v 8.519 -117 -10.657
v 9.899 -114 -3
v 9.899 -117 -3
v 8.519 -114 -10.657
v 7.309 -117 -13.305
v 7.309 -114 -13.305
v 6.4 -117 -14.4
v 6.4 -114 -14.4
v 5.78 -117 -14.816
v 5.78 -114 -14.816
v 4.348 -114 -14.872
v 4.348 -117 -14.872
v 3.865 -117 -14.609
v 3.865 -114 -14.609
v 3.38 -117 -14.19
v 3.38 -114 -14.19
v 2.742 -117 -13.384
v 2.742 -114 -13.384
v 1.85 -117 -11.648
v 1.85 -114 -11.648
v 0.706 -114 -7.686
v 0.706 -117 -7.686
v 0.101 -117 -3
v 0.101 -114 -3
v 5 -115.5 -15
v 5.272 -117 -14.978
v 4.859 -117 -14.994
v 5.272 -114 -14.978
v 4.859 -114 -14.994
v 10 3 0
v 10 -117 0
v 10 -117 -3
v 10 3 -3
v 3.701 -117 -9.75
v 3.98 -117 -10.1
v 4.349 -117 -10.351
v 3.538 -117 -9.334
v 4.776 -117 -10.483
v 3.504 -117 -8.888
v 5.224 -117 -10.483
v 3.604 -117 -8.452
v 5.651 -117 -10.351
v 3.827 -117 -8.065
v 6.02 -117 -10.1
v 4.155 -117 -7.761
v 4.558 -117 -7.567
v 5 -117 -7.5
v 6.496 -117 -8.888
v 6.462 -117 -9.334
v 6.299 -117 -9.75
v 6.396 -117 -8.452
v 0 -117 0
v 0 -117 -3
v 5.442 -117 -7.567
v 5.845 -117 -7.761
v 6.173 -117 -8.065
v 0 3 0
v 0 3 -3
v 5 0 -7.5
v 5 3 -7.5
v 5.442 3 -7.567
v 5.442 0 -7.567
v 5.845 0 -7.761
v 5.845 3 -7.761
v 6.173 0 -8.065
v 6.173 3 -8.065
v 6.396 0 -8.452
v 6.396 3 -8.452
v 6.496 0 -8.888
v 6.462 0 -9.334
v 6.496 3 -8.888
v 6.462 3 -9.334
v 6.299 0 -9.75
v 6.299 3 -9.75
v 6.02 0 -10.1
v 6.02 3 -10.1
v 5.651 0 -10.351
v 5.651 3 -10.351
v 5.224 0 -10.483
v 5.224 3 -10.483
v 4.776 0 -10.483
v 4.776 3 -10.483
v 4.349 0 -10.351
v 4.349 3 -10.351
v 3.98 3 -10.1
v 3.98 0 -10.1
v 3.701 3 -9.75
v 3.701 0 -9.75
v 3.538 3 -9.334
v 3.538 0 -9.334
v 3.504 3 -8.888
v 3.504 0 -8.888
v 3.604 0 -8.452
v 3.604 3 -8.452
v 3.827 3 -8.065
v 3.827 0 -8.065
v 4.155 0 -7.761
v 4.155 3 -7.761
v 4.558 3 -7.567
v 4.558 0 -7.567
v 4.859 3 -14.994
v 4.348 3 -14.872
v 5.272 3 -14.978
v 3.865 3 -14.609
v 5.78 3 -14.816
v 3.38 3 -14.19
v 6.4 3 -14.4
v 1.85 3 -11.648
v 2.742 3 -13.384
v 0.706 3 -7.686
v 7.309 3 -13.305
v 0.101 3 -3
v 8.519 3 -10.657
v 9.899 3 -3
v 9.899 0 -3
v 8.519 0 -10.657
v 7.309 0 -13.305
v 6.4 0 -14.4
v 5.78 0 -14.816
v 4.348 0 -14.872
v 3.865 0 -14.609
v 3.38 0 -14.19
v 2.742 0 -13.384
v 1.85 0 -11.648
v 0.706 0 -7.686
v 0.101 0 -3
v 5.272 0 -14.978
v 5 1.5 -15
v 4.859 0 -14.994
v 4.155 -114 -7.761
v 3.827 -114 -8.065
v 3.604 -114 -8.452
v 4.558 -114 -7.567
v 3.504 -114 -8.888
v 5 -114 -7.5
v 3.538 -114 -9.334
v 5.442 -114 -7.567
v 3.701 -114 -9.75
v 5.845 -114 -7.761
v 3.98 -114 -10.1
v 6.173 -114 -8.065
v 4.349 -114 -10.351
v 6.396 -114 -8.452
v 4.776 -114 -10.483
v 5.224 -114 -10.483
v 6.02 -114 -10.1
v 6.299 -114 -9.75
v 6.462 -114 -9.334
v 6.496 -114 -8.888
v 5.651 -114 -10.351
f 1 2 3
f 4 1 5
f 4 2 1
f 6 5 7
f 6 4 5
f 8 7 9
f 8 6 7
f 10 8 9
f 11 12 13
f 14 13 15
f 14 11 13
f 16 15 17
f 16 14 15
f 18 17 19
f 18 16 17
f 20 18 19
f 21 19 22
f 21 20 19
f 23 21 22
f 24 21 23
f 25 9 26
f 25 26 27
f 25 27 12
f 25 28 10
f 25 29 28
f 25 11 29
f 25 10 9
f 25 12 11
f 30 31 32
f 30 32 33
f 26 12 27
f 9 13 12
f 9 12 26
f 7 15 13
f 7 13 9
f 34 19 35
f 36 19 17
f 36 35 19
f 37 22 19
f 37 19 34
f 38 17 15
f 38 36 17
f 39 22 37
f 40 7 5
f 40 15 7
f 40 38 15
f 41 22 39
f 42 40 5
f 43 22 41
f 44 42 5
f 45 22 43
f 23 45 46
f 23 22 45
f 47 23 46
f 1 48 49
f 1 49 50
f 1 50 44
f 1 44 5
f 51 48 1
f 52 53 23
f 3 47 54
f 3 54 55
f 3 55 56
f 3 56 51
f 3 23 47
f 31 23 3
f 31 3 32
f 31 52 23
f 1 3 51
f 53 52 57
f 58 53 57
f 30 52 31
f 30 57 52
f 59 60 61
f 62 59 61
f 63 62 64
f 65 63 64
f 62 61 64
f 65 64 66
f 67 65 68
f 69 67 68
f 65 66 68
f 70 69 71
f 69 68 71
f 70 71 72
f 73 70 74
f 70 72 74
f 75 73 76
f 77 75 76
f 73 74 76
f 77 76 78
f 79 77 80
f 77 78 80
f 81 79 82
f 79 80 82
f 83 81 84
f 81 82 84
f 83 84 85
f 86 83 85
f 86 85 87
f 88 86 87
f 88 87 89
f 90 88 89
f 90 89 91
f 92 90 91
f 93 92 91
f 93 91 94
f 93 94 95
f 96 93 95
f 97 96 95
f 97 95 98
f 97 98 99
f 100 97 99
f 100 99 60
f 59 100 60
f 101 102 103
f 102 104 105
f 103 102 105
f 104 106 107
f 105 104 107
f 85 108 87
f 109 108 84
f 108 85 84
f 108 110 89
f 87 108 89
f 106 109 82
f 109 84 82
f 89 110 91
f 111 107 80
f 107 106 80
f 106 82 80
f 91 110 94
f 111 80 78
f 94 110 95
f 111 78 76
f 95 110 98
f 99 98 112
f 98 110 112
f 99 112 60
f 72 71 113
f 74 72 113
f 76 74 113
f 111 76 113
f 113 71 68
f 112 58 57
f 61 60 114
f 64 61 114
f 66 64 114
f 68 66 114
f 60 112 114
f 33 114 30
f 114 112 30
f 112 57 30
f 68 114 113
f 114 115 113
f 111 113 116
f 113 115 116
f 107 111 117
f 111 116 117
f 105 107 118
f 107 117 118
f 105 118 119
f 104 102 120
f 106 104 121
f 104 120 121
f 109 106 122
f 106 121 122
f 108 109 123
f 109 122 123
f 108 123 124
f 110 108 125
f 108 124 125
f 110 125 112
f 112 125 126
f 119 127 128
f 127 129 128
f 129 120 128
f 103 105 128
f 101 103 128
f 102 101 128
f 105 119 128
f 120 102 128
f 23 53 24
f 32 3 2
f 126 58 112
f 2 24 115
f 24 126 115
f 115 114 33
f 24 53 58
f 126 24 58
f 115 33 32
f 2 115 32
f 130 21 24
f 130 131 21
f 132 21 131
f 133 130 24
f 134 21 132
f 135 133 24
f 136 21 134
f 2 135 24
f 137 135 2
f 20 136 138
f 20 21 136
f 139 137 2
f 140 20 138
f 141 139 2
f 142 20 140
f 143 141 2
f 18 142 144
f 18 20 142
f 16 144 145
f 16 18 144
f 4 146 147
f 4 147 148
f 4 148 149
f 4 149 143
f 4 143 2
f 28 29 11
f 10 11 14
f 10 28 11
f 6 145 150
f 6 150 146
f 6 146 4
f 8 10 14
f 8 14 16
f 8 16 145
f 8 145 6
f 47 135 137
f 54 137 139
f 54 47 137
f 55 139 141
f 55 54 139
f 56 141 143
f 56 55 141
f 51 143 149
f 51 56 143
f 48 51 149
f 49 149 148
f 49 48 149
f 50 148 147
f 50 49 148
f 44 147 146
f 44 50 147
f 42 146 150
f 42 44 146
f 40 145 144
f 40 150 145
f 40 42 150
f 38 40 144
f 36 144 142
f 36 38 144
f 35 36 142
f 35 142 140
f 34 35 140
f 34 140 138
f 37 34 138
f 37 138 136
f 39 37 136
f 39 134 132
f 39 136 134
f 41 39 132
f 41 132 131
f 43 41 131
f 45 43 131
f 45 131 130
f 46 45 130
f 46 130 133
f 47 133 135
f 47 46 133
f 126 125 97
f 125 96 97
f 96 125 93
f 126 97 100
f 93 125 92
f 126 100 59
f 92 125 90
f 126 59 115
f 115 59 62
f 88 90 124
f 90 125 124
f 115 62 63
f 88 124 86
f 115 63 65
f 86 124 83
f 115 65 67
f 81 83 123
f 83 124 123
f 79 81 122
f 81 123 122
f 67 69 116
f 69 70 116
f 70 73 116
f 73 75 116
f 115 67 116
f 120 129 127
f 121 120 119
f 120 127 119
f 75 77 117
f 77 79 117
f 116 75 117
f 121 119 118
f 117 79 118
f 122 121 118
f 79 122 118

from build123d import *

# Parameters (mm, degrees)
BOSS_EXTRUDE1_DEPTH = 3
SKETCH2_R           = 1.5
CUT_EXTRUDE1_DEPTH  = 19.275667036
SKETCH3_W           = 10
SKETCH3_H           = 120
BOSS_EXTRUDE2_DEPTH = 3


with BuildPart() as part:
    # Sketch1 → Boss-Extrude1 (new body)
    with BuildSketch(Plane(origin=(0, 0, 0), x_dir=(1, 0, 0), z_dir=(0, 1, 0))):
        with BuildLine():
            Line((0, 0), (10, 0))
            add(Edge.make_bspline(
                [(10, 0), (10, 15), (5, 15), (0, 15), (0, 0)],
                knots=[4.71238898, 4.71238898, 4.71238898, 6.283185307, 6.283185307, 7.853981634, 7.853981634, 7.853981634], degree=2, weights=[1, 0.707106781, 1, 0.707106781, 1]))
        make_face()
    boss_extrude1 = extrude(amount=BOSS_EXTRUDE1_DEPTH)

    # Sketch2 → Cut-Extrude1 (cut, through all)
    with BuildSketch(Plane(origin=(0, 3, 0), x_dir=(1, 0, 0), z_dir=(0, 1, 0))):
        with Locations(Location((5, 9, 0), (0, 0, 270))):
            Circle(SKETCH2_R)
    cut_extrude1 = extrude(amount=-CUT_EXTRUDE1_DEPTH, mode=Mode.SUBTRACT)

    # Sketch3 → Boss-Extrude2 (add)
    with BuildSketch(Plane.XY):
        with Locations((5, -57)):
            Rectangle(SKETCH3_W, SKETCH3_H)
    extrude(amount=-BOSS_EXTRUDE2_DEPTH)

    # Mirror1: Boss-Extrude1, Cut-Extrude1 across plane
    add(boss_extrude1.mirror(Plane.ZX.offset(-57)))
    add(cut_extrude1.mirror(Plane.ZX.offset(-57)), mode=Mode.SUBTRACT)


solid = part.part
